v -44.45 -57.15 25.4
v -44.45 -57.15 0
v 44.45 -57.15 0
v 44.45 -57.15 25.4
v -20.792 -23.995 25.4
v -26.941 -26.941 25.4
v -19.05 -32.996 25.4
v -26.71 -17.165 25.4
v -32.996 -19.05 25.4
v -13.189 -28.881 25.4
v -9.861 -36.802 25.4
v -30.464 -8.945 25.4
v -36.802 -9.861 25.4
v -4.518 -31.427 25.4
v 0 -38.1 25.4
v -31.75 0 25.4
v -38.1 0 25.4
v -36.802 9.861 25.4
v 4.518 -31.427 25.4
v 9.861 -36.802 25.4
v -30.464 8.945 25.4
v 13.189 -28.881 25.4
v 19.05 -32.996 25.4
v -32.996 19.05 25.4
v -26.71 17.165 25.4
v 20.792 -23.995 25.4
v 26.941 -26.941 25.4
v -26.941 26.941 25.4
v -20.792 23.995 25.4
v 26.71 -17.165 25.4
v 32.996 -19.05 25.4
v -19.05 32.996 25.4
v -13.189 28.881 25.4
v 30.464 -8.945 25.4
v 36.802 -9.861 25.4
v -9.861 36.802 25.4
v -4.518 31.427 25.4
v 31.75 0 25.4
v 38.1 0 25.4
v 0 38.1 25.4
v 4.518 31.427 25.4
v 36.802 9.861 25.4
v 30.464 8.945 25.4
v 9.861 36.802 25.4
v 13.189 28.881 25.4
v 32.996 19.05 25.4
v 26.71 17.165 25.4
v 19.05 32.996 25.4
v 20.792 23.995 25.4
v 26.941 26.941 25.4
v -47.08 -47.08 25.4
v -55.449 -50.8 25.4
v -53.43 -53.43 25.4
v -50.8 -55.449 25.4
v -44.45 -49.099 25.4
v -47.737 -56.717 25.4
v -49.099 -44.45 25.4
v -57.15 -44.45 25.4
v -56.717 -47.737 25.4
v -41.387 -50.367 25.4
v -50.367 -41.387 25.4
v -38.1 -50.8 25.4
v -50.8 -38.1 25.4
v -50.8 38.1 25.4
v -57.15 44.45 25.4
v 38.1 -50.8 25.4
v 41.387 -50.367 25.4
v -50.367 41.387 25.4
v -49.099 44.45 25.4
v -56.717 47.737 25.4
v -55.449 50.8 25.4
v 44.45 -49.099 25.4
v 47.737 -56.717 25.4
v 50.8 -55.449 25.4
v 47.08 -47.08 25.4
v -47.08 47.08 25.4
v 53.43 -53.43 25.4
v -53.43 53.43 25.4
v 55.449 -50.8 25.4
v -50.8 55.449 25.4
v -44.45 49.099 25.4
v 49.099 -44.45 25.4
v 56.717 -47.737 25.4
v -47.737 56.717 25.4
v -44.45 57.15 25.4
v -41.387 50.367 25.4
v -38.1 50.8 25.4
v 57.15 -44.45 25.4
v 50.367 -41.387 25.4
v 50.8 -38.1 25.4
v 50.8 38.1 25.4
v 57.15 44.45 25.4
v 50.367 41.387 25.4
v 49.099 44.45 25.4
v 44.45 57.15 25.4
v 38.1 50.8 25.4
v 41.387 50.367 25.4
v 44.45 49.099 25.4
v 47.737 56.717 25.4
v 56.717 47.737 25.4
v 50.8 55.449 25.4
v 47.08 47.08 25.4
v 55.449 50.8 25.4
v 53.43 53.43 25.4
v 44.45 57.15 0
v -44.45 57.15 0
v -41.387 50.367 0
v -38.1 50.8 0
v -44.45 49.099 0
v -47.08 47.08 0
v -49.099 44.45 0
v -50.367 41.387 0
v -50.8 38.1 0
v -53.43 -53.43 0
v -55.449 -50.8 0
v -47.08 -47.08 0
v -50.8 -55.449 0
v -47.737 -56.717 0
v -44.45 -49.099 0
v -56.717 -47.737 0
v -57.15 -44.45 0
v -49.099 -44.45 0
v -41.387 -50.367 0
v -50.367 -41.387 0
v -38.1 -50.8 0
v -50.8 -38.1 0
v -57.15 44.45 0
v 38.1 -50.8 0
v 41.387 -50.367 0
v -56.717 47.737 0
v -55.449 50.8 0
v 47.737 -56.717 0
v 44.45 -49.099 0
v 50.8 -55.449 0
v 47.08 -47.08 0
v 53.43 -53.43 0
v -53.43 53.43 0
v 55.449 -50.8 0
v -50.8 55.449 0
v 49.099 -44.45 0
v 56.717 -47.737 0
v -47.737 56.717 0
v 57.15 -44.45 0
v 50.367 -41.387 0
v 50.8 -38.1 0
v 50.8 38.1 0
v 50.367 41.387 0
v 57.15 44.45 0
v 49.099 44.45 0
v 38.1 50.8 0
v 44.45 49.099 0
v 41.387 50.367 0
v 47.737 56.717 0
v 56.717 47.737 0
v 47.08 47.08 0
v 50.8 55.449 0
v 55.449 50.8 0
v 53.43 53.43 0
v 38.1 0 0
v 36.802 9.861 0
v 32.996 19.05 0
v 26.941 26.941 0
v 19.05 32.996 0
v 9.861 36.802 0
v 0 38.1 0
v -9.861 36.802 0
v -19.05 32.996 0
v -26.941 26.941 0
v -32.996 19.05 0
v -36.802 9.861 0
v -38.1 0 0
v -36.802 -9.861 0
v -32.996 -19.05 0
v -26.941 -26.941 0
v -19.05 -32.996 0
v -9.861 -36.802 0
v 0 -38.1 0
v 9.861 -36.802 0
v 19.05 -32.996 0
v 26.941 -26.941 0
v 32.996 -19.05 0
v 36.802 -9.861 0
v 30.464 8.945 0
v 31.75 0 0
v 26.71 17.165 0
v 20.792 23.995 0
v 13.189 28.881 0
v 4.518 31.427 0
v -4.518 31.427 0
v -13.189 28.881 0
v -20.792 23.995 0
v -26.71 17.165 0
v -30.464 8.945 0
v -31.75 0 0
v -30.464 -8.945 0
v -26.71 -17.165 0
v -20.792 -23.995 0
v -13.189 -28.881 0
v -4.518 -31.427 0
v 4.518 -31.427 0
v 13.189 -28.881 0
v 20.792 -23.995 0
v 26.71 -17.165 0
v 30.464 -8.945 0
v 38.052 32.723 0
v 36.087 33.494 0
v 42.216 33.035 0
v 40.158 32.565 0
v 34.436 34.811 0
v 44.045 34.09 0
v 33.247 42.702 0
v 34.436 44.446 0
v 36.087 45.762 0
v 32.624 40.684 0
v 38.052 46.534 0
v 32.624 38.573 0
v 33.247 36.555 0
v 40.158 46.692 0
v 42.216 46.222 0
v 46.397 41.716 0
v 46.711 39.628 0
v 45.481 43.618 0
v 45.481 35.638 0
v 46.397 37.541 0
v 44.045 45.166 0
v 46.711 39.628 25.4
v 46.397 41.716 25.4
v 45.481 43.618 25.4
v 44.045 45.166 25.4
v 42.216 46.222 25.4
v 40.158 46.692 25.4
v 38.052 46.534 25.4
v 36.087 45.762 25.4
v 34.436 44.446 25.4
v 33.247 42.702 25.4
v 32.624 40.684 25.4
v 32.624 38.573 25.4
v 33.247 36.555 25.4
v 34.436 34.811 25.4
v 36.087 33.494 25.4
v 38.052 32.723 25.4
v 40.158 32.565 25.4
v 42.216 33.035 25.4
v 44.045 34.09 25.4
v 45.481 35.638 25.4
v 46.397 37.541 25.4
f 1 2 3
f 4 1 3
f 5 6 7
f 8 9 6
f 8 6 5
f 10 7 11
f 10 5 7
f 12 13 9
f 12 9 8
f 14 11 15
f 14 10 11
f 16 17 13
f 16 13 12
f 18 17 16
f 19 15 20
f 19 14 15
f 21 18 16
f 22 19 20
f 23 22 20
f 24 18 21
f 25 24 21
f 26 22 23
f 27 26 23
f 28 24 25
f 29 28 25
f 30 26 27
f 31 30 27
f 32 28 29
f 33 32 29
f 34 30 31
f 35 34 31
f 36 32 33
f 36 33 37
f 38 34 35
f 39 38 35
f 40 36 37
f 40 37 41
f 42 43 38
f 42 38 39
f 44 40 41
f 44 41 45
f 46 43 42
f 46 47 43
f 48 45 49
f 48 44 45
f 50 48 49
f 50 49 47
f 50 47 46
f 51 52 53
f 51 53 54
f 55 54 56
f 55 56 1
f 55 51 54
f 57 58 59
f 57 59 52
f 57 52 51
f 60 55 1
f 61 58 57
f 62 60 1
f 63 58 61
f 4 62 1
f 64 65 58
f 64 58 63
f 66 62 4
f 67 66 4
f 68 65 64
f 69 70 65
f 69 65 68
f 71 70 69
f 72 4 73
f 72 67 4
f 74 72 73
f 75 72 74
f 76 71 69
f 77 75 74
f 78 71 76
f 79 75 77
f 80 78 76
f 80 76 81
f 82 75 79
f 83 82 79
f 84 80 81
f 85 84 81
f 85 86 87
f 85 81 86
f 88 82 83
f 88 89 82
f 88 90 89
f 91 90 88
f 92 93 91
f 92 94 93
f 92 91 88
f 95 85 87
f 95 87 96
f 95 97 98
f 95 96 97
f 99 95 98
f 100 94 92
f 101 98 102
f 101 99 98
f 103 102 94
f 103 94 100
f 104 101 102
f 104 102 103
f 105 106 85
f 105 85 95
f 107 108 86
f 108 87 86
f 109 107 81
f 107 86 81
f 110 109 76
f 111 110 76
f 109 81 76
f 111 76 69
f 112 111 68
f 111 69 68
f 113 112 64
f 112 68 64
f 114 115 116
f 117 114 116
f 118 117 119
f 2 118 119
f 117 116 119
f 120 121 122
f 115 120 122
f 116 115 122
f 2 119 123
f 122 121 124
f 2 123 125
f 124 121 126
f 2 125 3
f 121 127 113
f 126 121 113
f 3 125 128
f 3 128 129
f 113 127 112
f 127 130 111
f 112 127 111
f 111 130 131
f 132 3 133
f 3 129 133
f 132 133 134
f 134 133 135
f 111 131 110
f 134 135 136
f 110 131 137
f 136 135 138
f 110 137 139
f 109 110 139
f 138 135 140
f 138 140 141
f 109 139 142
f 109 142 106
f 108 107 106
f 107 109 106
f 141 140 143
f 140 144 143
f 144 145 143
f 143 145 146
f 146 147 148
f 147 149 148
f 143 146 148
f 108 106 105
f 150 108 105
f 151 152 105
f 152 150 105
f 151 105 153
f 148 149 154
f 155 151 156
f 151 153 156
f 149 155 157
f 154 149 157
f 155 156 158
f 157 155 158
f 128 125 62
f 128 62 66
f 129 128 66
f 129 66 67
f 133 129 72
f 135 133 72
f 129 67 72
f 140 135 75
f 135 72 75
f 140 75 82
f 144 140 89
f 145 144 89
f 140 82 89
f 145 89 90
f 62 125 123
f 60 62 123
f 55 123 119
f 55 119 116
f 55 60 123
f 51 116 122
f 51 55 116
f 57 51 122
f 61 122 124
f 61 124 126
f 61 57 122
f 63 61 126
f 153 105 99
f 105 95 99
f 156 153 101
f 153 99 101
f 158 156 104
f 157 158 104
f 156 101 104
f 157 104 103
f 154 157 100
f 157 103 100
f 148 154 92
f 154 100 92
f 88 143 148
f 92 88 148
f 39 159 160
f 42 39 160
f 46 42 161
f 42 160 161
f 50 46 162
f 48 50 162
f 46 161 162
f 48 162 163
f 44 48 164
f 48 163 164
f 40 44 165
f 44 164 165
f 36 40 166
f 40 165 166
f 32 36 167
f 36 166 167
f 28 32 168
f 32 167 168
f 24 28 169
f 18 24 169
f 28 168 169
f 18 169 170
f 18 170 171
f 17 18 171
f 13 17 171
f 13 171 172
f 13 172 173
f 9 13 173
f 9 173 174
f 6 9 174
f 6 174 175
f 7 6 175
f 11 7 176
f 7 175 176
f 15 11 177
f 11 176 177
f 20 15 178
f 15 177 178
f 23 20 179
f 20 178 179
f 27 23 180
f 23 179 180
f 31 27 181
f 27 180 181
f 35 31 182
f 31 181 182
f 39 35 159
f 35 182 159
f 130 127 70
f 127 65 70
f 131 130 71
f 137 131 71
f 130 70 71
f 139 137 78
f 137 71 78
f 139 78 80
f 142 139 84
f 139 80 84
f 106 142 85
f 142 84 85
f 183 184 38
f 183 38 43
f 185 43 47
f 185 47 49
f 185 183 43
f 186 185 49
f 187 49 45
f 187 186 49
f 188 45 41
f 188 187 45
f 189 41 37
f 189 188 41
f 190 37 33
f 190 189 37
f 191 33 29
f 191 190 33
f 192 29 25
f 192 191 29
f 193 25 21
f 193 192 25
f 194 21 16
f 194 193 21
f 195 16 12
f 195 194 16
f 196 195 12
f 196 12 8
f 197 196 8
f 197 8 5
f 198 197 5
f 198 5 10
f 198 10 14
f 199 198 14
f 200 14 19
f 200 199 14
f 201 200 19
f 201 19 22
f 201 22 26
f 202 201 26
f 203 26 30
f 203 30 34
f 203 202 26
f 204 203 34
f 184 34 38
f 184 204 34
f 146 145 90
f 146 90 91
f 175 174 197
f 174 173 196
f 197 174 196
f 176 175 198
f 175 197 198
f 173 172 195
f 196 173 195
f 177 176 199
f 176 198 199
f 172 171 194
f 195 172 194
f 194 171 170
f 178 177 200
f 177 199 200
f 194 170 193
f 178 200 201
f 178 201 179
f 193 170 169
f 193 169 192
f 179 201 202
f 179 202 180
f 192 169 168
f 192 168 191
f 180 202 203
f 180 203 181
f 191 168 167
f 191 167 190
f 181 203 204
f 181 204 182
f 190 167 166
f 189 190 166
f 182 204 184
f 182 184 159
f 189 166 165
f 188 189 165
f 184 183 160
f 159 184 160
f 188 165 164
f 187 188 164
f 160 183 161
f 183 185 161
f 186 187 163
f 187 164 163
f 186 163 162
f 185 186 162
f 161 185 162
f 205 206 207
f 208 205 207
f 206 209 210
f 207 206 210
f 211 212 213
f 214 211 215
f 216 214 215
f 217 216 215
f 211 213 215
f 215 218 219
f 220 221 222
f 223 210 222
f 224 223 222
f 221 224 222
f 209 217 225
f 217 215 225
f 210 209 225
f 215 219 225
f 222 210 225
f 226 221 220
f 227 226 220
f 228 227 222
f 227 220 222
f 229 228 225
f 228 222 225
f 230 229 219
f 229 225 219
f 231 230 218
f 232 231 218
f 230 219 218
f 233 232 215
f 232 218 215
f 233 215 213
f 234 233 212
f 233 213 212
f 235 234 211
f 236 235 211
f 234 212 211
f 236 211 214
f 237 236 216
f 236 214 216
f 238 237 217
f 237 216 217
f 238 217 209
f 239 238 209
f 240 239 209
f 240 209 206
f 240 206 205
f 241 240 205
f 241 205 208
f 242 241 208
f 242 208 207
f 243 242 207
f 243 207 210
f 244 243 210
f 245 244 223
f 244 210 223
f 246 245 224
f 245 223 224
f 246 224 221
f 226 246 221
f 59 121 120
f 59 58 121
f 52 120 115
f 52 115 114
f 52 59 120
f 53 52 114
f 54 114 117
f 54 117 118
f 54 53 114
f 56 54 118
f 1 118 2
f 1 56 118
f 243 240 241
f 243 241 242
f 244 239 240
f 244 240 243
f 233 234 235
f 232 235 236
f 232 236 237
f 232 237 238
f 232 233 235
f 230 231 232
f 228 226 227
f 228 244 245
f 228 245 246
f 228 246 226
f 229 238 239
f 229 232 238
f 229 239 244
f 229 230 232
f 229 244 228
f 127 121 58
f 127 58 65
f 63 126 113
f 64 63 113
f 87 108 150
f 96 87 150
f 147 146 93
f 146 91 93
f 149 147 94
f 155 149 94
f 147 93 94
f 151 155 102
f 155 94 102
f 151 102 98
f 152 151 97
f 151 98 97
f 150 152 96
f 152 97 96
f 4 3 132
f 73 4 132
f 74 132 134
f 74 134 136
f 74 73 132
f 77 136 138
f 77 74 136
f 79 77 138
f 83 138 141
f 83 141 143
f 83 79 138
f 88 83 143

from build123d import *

# Parameters (mm, degrees)
F0_W     = 114.3
F0_H     = 114.3
F0_W_2   = 101.6
F0_H_2   = 101.6
F0_R     = 38.1
F0_R_2   = 31.75
F0_R_3   = 7.083114
F1_DEPTH = 25.4
F2_R     = 12.7


with BuildPart() as f1:
    # F0 (on Top) → F1 (new body)
    with BuildSketch(Plane.XY):
        Rectangle(F0_W, F0_H)
        Rectangle(F0_W_2, F0_H_2, mode=Mode.SUBTRACT)
        Circle(F0_R)
        Circle(F0_R_2, mode=Mode.SUBTRACT)
        with Locations((39.628297, 39.628297)):
            Circle(F0_R_3)
    extrude(amount=F1_DEPTH)

    # F2
    f2_edges = [f1.edges().sort_by_distance(p)[0] for p in [
        (-57.15, -57.15, 12.7),
        (-50.8, 50.8, 12.7),
        (-50.8, -50.8, 12.7),
        (50.8, 50.8, 12.7),
        (57.15, -57.15, 12.7),
        (-57.15, 57.15, 12.7),
        (57.15, 57.15, 12.7),
        (50.8, -50.8, 12.7),
    ]]
    fillet(f2_edges, radius=F2_R)


solid = f1.part
